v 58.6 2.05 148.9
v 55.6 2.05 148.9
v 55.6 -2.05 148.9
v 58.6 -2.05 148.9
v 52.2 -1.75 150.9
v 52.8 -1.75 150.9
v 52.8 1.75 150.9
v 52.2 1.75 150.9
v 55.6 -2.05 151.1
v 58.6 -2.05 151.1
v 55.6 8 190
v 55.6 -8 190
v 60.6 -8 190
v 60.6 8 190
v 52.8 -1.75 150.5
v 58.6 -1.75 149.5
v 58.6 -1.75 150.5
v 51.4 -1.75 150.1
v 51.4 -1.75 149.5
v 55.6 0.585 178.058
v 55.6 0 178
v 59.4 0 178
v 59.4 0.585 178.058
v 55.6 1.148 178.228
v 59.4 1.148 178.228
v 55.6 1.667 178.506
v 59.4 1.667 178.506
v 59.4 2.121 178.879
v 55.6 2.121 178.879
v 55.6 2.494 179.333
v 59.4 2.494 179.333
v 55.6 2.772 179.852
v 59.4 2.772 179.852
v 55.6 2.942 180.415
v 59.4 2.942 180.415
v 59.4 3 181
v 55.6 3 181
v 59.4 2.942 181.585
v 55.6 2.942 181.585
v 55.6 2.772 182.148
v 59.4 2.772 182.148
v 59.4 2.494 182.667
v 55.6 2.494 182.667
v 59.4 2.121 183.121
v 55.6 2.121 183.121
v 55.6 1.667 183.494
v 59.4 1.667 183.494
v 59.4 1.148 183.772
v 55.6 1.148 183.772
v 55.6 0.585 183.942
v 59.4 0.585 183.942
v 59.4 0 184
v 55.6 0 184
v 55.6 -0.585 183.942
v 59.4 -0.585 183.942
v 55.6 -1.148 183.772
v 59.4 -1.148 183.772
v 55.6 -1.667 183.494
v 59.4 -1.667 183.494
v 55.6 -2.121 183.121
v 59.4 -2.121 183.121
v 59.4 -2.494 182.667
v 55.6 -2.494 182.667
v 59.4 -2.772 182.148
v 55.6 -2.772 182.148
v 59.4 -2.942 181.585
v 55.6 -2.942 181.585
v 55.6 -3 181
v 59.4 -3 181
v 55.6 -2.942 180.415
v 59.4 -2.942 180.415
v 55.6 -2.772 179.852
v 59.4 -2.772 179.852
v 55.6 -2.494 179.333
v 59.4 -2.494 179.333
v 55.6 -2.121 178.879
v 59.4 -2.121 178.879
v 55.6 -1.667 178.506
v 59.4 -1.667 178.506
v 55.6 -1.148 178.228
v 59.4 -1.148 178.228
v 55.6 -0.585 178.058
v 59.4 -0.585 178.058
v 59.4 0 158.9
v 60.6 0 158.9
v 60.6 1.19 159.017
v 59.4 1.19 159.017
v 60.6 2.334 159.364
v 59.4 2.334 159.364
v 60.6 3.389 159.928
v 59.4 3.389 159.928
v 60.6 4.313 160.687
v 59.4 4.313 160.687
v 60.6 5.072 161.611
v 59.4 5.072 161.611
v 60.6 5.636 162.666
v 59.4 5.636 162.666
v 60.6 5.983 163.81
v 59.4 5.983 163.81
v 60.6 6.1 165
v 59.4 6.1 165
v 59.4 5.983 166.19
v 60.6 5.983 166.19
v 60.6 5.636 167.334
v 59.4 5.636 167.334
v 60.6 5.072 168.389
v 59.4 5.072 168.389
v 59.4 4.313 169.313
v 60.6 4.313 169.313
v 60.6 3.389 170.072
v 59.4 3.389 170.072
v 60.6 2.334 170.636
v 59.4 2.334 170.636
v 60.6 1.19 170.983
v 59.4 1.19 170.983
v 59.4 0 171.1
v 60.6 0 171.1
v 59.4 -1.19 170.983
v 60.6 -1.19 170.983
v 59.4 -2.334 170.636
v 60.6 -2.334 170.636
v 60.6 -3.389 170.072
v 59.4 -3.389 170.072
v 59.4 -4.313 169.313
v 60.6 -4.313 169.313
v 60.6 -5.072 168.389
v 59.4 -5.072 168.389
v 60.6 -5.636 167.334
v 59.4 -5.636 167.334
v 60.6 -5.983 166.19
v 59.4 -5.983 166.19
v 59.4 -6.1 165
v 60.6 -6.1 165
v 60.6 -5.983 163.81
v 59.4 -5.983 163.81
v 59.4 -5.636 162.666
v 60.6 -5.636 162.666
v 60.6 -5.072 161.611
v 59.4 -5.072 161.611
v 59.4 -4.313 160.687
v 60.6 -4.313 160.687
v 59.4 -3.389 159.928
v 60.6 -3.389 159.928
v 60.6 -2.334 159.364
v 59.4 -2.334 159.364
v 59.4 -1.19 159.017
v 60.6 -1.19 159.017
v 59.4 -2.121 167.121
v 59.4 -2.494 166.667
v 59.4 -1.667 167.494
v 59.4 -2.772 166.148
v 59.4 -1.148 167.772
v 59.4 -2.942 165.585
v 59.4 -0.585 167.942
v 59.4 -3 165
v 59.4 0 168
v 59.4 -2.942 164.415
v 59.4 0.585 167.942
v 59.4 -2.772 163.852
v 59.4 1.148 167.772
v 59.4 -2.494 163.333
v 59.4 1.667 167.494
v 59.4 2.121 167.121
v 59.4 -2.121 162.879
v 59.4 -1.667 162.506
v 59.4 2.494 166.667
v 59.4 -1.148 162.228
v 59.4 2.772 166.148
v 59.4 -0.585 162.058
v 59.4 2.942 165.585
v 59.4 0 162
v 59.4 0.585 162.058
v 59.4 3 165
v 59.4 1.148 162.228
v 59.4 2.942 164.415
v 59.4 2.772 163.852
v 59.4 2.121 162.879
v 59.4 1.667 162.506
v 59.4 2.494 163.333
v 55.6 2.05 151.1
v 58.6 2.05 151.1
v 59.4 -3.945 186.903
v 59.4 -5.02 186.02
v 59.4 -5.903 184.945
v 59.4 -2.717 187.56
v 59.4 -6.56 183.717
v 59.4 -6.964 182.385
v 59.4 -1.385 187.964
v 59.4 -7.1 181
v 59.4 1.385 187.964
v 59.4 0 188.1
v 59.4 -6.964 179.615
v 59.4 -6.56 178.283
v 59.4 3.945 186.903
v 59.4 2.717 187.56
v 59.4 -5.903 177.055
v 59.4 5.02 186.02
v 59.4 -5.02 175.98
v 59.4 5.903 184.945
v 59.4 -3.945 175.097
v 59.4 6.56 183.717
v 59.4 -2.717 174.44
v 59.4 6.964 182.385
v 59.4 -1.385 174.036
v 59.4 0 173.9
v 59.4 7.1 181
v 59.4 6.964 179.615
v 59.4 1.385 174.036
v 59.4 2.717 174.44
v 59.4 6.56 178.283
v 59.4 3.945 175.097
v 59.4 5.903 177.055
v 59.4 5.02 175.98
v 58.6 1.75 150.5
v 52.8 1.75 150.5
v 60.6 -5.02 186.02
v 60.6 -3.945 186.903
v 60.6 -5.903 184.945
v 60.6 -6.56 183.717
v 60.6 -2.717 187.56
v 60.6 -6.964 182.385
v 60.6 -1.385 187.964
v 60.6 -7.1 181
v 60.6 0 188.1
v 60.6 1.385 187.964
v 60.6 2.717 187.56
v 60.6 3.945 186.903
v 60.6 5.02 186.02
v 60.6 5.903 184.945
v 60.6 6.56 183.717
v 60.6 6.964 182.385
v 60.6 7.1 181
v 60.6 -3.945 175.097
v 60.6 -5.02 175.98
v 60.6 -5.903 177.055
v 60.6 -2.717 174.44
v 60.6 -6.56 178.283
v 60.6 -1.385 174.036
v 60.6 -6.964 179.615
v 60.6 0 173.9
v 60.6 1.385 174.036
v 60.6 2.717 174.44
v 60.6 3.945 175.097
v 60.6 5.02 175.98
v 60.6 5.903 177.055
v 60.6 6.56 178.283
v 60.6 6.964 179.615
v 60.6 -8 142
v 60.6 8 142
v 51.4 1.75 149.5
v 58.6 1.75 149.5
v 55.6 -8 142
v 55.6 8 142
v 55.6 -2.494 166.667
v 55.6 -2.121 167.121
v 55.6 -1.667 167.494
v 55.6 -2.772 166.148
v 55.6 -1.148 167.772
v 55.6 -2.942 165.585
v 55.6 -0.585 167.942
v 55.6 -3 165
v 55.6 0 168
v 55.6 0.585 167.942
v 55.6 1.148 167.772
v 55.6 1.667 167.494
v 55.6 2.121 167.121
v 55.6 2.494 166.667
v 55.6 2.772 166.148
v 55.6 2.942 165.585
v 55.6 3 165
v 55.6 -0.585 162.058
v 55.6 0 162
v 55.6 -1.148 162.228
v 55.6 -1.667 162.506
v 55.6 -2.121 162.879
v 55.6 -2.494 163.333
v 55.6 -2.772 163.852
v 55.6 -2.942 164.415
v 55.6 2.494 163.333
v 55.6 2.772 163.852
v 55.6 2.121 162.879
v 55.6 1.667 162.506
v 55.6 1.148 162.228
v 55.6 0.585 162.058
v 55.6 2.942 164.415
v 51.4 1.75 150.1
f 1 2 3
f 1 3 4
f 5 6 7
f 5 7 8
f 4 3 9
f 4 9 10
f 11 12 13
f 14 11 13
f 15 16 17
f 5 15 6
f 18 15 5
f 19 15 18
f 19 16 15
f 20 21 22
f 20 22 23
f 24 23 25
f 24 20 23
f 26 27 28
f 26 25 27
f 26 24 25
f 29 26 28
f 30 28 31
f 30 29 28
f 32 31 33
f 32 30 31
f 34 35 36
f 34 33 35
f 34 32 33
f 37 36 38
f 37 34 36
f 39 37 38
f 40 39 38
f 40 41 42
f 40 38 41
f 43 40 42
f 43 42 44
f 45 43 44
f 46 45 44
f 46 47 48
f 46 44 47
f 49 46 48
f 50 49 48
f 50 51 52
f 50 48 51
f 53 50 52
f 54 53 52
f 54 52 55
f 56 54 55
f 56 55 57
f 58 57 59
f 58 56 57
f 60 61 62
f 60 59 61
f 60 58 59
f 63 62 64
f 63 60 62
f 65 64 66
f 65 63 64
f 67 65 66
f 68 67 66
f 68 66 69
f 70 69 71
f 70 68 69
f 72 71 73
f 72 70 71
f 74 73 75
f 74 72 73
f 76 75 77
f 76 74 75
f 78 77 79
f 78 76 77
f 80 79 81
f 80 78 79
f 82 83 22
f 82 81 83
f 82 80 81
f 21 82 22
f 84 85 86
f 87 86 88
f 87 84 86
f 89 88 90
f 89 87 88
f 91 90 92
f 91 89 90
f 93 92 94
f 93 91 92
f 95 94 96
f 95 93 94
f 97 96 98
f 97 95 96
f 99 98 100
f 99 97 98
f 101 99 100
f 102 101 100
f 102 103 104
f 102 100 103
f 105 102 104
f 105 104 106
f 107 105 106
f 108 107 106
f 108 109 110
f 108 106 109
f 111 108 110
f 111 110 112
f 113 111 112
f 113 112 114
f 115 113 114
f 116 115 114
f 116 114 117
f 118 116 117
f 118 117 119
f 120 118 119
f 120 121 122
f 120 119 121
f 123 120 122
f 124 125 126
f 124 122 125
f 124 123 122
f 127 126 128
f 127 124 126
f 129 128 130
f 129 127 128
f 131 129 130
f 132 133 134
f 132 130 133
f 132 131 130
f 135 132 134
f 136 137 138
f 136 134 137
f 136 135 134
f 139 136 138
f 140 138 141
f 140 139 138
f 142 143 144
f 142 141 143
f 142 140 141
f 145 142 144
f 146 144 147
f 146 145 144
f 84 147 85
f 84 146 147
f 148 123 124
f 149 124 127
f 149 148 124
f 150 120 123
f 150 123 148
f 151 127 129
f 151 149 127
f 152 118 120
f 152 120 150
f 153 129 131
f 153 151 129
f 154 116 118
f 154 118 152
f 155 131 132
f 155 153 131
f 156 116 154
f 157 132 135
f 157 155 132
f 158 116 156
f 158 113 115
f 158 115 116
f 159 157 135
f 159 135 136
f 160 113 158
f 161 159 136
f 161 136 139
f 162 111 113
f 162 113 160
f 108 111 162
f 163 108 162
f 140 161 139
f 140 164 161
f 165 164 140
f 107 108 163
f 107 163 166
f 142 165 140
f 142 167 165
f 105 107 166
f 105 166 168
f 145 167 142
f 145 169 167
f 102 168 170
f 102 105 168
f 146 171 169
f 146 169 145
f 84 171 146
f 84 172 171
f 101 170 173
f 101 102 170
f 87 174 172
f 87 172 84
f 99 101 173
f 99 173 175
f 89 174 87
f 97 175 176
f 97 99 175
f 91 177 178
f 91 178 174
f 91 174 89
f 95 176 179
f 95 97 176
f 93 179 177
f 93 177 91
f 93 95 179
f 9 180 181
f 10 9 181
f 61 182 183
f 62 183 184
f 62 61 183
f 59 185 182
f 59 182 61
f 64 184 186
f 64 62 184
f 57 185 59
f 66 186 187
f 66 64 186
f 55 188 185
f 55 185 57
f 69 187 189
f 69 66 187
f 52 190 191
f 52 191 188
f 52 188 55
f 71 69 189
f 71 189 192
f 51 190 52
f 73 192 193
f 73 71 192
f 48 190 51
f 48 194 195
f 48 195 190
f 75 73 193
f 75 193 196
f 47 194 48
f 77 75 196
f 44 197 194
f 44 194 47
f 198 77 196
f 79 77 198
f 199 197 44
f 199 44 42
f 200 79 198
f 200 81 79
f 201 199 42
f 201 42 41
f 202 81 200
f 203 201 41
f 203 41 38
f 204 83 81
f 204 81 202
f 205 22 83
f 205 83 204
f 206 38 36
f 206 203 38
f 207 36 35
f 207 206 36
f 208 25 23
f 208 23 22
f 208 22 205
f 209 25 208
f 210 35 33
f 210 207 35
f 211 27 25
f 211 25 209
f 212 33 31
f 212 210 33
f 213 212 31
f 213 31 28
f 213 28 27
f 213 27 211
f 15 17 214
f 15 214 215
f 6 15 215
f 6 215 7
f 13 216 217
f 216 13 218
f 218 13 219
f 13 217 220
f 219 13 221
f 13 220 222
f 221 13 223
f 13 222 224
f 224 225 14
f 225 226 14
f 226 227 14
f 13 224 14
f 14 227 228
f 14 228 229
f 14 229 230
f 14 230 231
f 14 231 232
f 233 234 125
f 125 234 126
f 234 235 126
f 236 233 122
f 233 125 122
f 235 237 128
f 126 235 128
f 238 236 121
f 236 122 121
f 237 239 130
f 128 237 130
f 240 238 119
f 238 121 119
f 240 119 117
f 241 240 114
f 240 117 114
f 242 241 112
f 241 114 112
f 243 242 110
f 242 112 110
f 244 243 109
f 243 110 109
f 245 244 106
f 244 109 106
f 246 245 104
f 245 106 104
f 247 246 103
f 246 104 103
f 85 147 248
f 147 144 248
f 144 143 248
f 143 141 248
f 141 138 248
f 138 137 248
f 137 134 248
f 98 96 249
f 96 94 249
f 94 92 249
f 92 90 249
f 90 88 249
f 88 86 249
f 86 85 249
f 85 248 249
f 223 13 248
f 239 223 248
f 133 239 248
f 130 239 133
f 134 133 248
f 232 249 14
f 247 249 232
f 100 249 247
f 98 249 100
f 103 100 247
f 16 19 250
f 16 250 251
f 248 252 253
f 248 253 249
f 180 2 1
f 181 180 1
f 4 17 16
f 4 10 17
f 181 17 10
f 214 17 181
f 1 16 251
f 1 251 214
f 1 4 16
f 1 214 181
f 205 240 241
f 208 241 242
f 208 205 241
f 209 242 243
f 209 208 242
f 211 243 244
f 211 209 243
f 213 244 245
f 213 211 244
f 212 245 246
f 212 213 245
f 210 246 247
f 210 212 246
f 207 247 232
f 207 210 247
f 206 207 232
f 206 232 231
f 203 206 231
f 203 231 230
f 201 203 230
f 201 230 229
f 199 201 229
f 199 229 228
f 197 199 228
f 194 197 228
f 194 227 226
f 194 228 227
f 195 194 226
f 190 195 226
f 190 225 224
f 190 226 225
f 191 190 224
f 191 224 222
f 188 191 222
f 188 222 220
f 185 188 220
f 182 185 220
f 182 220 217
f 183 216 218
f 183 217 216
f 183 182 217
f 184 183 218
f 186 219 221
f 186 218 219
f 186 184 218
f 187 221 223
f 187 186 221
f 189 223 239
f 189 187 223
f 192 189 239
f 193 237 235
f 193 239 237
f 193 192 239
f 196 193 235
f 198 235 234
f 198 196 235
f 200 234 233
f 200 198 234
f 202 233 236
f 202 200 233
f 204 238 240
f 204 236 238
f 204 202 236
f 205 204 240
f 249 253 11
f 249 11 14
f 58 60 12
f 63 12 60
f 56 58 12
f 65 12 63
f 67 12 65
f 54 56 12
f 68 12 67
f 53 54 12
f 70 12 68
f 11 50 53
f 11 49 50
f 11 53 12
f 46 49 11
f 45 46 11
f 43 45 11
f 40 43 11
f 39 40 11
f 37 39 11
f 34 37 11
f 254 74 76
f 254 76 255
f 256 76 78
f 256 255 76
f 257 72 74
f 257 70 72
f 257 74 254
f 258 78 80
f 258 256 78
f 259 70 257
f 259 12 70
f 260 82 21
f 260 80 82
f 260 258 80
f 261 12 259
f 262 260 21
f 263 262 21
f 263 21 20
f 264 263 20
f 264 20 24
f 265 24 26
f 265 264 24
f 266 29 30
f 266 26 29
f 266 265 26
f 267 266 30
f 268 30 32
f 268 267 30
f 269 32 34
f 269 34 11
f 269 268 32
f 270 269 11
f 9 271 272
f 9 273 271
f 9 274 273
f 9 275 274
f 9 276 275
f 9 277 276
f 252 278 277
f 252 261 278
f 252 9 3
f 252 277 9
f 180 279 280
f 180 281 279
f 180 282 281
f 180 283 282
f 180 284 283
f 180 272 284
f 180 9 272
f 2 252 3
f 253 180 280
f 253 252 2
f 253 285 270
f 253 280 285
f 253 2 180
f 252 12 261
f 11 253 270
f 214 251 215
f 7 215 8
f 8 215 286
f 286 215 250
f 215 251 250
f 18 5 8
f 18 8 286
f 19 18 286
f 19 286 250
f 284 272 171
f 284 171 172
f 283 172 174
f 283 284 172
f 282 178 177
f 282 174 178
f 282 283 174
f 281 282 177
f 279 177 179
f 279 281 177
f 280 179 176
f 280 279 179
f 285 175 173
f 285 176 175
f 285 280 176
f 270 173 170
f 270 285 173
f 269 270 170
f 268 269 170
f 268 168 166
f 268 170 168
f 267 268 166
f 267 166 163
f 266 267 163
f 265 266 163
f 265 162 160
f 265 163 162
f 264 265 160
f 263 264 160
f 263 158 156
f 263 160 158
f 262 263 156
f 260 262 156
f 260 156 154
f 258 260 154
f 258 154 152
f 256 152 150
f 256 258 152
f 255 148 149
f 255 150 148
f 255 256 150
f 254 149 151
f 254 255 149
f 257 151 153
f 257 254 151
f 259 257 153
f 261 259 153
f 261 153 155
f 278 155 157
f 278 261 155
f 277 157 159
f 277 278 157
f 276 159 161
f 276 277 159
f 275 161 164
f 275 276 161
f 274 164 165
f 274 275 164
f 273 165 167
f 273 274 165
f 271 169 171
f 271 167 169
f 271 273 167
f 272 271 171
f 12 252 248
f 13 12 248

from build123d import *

# Parameters (mm, degrees)
BOSS_EXTRUDE1_START = 142
SKETCH1_W           = 5
SKETCH1_H           = 16
BOSS_EXTRUDE1_DEPTH = 48
BOSS_EXTRUDE2_START = 148.9
SKETCH2_W           = 3.1
SKETCH2_H           = 4.1
BOSS_EXTRUDE2_DEPTH = 2.2
BOSS_EXTRUDE3_START = -1.75
BOSS_EXTRUDE3_DEPTH = 3.5
BOSS_EXTRUDE4_START = 59.4
SKETCH4_R           = 6.1
BOSS_EXTRUDE4_DEPTH = 1.7
BOSS_EXTRUDE5_START = 55.1
SKETCH5_R           = 3
BOSS_EXTRUDE5_DEPTH = 4.4
BOSS_EXTRUDE6_START = 59.4
SKETCH6_R           = 7.1
BOSS_EXTRUDE6_DEPTH = 1.7
BOSS_EXTRUDE7_START = 55.1
SKETCH7_R           = 3
BOSS_EXTRUDE7_DEPTH = 4.4


with BuildPart() as part:
    # Sketch1 → Boss-Extrude1 (new body)
    with BuildSketch(Plane.XY.offset(BOSS_EXTRUDE1_START)):
        with Locations((58.1, 0)):
            Rectangle(SKETCH1_W, SKETCH1_H)
    extrude(amount=BOSS_EXTRUDE1_DEPTH)


with BuildPart() as body_2:
    # Sketch2 → Boss-Extrude2 (new body)
    with BuildSketch(Plane.XY.offset(BOSS_EXTRUDE2_START)):
        with Locations((57.05, 0)):
            Rectangle(SKETCH2_W, SKETCH2_H)
    extrude(amount=BOSS_EXTRUDE2_DEPTH)


with BuildPart() as part_1:
    add(part.part)

    # Combine1: cut body 2
    add(body_2.part, mode=Mode.SUBTRACT)

    # Sketch3 → Boss-Extrude3 (add)
    with BuildSketch(Plane(origin=(0, 0, 0), x_dir=(1, 0, 0), z_dir=(0, 1, 0)).offset(BOSS_EXTRUDE3_START)):
        Polygon((58.8, -149.5), (58.8, -150.5), (52.8, -150.5), (52.8, -150.9), (52.2, -150.9), (51.4, -150.1), (51.4, -149.5), align=None)
    extrude(amount=BOSS_EXTRUDE3_DEPTH)


with BuildPart() as body_2_2:
    # Sketch4 → Boss-Extrude4 (new body)
    with BuildSketch(Plane(origin=(0, 0, 0), x_dir=(0, 0, -1), z_dir=(1, 0, 0)).offset(BOSS_EXTRUDE4_START)):
        with Locations((-165, 0)):
            Circle(SKETCH4_R)
    extrude(amount=BOSS_EXTRUDE4_DEPTH)


with BuildPart() as part_2:
    add(part_1.part)

    # Combine2: cut body 2 2
    add(body_2_2.part, mode=Mode.SUBTRACT)


with BuildPart() as body_2_3:
    # Sketch5 → Boss-Extrude5 (new body)
    with BuildSketch(Plane(origin=(0, 0, 0), x_dir=(0, 0, -1), z_dir=(1, 0, 0)).offset(BOSS_EXTRUDE5_START)):
        with Locations((-165, 0)):
            Circle(SKETCH5_R)
    extrude(amount=BOSS_EXTRUDE5_DEPTH)


with BuildPart() as part_3:
    add(part_2.part)

    # Combine3: cut body 2 3
    add(body_2_3.part, mode=Mode.SUBTRACT)


with BuildPart() as body_2_4:
    # Sketch6 → Boss-Extrude6 (new body)
    with BuildSketch(Plane(origin=(0, 0, 0), x_dir=(0, 0, -1), z_dir=(1, 0, 0)).offset(BOSS_EXTRUDE6_START)):
        with Locations((-181, 0)):
            Circle(SKETCH6_R)
    extrude(amount=BOSS_EXTRUDE6_DEPTH)


with BuildPart() as part_4:
    add(part_3.part)

    # Combine4: cut body 2 4
    add(body_2_4.part, mode=Mode.SUBTRACT)


with BuildPart() as body_2_5:
    # Sketch7 → Boss-Extrude7 (new body)
    with BuildSketch(Plane(origin=(0, 0, 0), x_dir=(0, 0, -1), z_dir=(1, 0, 0)).offset(BOSS_EXTRUDE7_START)):
        with Locations((-181, 0)):
            Circle(SKETCH7_R)
    extrude(amount=BOSS_EXTRUDE7_DEPTH)


with BuildPart() as part_5:
    add(part_4.part)

    # Combine5: cut body 2 5
    add(body_2_5.part, mode=Mode.SUBTRACT)


solid = part_5.part
